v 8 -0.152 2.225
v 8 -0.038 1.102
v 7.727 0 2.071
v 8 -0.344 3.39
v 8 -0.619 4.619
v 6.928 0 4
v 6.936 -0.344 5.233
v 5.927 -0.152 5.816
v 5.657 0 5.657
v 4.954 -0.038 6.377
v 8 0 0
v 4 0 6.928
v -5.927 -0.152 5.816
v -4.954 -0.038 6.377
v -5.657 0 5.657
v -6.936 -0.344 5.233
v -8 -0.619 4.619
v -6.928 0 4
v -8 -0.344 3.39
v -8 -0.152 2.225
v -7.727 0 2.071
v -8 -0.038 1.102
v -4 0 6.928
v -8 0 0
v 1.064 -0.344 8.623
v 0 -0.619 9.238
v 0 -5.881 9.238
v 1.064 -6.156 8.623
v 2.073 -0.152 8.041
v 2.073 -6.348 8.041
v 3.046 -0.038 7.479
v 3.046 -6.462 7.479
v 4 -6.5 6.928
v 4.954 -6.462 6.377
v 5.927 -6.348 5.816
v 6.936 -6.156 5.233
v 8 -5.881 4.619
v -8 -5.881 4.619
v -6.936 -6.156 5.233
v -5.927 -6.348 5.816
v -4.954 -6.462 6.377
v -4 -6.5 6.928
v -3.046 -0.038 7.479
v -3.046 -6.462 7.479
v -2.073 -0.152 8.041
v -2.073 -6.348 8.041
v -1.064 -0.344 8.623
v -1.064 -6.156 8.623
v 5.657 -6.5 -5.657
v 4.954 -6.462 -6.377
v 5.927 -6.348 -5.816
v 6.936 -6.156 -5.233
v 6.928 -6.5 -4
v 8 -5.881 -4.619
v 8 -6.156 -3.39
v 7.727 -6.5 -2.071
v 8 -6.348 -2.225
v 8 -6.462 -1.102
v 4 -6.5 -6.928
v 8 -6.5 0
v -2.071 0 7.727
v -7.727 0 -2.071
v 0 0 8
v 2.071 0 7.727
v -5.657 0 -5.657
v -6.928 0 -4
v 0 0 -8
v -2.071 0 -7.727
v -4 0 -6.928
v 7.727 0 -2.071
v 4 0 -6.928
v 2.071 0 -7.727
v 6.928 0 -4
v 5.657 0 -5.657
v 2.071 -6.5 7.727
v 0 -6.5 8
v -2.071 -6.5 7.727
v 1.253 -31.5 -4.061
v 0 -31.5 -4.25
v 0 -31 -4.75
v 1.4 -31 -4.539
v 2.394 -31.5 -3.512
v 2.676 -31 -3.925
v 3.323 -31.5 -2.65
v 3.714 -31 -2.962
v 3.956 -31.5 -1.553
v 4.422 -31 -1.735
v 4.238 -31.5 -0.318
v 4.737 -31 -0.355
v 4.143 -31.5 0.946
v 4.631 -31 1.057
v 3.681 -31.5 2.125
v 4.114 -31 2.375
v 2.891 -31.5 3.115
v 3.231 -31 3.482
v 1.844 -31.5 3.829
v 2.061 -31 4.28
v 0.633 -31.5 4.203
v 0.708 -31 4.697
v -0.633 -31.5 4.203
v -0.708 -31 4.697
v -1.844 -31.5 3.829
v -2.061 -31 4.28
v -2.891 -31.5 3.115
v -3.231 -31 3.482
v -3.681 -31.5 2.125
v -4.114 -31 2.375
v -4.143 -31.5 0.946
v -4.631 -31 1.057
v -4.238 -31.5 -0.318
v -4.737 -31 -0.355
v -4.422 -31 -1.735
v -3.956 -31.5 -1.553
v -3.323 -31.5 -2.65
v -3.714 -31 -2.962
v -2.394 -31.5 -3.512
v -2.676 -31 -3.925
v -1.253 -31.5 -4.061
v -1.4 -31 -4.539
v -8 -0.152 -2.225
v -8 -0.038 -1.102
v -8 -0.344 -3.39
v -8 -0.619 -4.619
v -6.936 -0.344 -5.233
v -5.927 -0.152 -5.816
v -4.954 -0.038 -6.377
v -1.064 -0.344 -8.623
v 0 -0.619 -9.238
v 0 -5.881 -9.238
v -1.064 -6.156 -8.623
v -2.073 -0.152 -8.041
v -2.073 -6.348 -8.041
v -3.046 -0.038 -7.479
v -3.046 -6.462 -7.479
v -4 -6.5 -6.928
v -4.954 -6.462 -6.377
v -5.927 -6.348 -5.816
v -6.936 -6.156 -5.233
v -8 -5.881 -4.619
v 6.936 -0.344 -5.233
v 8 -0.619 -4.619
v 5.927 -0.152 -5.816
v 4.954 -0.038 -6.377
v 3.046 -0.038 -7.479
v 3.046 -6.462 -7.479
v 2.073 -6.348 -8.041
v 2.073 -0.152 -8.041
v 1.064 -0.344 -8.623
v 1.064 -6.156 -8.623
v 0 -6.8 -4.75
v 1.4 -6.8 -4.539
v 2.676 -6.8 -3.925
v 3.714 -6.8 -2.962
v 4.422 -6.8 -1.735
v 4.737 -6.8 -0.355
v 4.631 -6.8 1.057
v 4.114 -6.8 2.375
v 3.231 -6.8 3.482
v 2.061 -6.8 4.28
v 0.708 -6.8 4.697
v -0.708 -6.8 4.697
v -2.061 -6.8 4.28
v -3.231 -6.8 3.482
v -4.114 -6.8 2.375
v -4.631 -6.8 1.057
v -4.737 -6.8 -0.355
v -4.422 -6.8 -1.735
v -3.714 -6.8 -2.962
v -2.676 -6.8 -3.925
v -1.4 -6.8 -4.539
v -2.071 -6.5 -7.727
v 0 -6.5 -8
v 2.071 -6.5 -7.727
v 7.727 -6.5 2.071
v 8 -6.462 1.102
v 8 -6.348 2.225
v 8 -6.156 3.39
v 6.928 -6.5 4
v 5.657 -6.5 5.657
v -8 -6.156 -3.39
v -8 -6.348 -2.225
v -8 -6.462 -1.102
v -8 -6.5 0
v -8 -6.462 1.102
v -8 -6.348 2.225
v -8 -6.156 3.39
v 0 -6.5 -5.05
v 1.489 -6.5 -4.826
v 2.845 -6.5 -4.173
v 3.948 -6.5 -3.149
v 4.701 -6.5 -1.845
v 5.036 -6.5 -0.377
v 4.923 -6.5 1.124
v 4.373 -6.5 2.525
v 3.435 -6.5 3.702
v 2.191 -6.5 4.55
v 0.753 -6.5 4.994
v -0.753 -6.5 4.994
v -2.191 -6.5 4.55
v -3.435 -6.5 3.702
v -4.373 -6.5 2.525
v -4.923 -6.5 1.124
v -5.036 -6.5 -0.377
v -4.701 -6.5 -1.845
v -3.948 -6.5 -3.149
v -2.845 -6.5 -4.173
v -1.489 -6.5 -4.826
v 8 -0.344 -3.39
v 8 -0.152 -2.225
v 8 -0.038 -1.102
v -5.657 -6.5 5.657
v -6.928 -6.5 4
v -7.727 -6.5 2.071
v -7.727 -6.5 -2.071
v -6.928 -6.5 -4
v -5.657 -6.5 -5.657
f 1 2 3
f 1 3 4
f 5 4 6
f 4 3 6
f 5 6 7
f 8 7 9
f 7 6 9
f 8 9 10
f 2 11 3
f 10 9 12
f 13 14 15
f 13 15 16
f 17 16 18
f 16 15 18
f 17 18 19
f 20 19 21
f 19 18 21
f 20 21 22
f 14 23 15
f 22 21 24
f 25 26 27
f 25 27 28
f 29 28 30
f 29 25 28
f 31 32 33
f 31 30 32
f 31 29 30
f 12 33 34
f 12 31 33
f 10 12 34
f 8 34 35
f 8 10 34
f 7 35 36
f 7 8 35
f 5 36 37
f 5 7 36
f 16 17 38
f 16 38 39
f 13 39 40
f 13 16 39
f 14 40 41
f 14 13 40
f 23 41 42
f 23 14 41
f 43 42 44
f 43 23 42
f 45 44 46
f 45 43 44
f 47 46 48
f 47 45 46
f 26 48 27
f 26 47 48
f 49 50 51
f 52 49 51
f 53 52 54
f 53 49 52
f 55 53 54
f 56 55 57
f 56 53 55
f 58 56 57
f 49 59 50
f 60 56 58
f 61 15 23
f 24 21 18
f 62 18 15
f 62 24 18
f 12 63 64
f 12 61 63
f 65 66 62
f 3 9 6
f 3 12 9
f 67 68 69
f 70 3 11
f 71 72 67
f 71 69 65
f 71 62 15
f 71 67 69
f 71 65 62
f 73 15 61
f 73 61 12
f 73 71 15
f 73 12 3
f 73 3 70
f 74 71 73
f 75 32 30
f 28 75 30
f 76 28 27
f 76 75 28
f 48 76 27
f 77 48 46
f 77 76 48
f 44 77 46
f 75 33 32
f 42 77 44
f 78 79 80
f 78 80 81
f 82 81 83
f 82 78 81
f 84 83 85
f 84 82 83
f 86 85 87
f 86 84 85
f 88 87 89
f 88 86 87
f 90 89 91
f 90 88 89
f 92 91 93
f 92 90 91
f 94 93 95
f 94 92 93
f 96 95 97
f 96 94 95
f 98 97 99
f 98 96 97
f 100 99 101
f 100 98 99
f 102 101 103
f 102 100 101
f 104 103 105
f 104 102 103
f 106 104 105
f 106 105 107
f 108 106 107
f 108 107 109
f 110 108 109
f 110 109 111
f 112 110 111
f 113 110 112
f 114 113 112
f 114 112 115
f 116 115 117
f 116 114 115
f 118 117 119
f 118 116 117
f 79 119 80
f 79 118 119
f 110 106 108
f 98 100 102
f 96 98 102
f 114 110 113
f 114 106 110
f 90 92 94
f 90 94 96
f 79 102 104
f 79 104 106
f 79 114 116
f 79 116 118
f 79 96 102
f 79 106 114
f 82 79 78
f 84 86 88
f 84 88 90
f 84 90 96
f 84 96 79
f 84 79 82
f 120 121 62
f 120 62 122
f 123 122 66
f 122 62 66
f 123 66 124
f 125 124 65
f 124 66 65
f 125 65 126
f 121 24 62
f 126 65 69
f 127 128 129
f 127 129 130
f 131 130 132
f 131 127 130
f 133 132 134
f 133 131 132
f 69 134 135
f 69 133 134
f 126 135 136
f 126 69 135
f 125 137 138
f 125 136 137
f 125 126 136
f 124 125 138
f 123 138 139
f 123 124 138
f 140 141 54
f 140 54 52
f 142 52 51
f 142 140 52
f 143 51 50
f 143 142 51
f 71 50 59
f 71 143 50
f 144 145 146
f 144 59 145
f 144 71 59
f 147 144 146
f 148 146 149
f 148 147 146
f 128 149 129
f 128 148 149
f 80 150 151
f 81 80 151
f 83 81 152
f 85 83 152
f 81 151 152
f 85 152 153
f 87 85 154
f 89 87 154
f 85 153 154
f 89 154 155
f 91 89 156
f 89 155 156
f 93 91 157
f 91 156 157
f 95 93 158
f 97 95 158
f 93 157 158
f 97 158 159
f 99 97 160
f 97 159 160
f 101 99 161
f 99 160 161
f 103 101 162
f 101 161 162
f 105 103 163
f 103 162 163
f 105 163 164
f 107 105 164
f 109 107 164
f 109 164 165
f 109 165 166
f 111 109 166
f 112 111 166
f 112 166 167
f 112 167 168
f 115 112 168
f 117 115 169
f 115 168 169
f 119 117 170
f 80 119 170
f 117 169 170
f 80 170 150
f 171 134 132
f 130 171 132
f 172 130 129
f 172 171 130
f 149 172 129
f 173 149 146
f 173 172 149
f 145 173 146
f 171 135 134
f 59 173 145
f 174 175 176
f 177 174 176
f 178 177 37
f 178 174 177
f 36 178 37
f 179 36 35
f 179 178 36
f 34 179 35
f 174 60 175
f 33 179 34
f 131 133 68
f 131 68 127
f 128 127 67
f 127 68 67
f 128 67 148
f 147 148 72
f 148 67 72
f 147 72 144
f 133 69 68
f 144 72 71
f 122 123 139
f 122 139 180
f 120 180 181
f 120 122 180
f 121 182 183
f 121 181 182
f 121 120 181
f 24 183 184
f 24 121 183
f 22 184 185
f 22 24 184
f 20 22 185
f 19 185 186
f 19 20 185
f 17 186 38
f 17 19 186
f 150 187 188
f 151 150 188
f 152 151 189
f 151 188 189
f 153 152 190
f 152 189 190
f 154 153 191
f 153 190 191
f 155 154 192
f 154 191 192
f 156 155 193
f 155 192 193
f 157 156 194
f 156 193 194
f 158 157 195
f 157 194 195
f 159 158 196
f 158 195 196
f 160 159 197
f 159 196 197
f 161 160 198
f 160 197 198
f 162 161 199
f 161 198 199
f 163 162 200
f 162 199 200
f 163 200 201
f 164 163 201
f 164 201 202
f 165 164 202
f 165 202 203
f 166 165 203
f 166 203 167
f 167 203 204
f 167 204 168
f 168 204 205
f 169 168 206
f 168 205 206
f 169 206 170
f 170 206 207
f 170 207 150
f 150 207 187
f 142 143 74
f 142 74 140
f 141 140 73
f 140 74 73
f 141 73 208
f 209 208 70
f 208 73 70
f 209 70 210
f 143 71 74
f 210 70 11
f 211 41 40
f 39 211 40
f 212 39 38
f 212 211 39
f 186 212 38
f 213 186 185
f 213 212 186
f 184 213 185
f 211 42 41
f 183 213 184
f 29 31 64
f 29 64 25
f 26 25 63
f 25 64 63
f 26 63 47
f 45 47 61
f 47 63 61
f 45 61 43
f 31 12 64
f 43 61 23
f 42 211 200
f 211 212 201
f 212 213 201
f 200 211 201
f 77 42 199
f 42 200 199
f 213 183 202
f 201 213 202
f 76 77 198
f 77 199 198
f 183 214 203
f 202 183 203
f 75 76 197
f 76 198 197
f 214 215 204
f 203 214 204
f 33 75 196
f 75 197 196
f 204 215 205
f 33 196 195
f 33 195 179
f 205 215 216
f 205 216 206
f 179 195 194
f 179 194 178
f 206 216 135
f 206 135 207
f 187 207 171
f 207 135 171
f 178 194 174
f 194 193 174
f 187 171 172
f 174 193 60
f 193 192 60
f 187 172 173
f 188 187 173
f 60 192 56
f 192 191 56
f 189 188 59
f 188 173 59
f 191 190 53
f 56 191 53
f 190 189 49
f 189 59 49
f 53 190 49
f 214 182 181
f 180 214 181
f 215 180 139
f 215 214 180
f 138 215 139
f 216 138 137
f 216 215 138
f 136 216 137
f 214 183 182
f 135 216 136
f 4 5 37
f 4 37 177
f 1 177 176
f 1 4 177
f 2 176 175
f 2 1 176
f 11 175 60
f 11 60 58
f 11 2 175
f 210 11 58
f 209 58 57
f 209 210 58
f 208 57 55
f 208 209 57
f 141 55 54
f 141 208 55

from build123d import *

# Parameters (mm, degrees)
BOSS_EXTRUDE1_DEPTH = 6.5
SKETCH3_R           = 4.75
BOSS_EXTRUDE2_DEPTH = 25
CHAMFER1_SIZE       = 0.5
CHAMFER2_SIZE       = 0.3


with BuildPart() as part:
    # Sketch1 → Boss-Extrude1 (new body)
    with BuildSketch(Plane(origin=(0, 0, 0), x_dir=(1, 0, 0), z_dir=(0, 1, 0))):
        Polygon((0, 9.237604307), (-8, 4.618802154), (-8, -4.618802154), (0, -9.237604307), (8, -4.618802154), (8, 4.618802154), align=None)
    extrude(amount=-BOSS_EXTRUDE1_DEPTH)

    # Sketch2 → Cut-Revolve1 (revolve, cut)
    with BuildSketch(Plane.XY):
        Polygon((-11, -1.5), (-8, 0), (-8, 1), (-11, 1), align=None)
    cut_revolve1 = revolve(axis=Axis((0, 50, 0), (0, -1, 0)), mode=Mode.SUBTRACT)

    # Sketch3 → Boss-Extrude2 (add)
    with BuildSketch(Plane.XZ.offset(6.5)):
        with Locations(Location((0, 0, 0), (0, 0, 270))):
            Circle(SKETCH3_R)
    extrude(amount=BOSS_EXTRUDE2_DEPTH)

    # Chamfer1
    chamfer1_edges = [part.edges().sort_by_distance(p)[0] for p in [
        (0, -31.5, 4.75),
    ]]
    chamfer(chamfer1_edges, length=CHAMFER1_SIZE)

    # Mirror1: Cut-Revolve1 across plane
    add(cut_revolve1.mirror(Plane(origin=(0, -3.25, 0), x_dir=(0, 0, 1), z_dir=(0, -1, 0))), mode=Mode.SUBTRACT)

    # Chamfer2
    chamfer2_edges = [part.edges().sort_by_distance(p)[0] for p in [
        (0, -6.5, 4.75),
    ]]
    chamfer(chamfer2_edges, length=CHAMFER2_SIZE)


solid = part.part
